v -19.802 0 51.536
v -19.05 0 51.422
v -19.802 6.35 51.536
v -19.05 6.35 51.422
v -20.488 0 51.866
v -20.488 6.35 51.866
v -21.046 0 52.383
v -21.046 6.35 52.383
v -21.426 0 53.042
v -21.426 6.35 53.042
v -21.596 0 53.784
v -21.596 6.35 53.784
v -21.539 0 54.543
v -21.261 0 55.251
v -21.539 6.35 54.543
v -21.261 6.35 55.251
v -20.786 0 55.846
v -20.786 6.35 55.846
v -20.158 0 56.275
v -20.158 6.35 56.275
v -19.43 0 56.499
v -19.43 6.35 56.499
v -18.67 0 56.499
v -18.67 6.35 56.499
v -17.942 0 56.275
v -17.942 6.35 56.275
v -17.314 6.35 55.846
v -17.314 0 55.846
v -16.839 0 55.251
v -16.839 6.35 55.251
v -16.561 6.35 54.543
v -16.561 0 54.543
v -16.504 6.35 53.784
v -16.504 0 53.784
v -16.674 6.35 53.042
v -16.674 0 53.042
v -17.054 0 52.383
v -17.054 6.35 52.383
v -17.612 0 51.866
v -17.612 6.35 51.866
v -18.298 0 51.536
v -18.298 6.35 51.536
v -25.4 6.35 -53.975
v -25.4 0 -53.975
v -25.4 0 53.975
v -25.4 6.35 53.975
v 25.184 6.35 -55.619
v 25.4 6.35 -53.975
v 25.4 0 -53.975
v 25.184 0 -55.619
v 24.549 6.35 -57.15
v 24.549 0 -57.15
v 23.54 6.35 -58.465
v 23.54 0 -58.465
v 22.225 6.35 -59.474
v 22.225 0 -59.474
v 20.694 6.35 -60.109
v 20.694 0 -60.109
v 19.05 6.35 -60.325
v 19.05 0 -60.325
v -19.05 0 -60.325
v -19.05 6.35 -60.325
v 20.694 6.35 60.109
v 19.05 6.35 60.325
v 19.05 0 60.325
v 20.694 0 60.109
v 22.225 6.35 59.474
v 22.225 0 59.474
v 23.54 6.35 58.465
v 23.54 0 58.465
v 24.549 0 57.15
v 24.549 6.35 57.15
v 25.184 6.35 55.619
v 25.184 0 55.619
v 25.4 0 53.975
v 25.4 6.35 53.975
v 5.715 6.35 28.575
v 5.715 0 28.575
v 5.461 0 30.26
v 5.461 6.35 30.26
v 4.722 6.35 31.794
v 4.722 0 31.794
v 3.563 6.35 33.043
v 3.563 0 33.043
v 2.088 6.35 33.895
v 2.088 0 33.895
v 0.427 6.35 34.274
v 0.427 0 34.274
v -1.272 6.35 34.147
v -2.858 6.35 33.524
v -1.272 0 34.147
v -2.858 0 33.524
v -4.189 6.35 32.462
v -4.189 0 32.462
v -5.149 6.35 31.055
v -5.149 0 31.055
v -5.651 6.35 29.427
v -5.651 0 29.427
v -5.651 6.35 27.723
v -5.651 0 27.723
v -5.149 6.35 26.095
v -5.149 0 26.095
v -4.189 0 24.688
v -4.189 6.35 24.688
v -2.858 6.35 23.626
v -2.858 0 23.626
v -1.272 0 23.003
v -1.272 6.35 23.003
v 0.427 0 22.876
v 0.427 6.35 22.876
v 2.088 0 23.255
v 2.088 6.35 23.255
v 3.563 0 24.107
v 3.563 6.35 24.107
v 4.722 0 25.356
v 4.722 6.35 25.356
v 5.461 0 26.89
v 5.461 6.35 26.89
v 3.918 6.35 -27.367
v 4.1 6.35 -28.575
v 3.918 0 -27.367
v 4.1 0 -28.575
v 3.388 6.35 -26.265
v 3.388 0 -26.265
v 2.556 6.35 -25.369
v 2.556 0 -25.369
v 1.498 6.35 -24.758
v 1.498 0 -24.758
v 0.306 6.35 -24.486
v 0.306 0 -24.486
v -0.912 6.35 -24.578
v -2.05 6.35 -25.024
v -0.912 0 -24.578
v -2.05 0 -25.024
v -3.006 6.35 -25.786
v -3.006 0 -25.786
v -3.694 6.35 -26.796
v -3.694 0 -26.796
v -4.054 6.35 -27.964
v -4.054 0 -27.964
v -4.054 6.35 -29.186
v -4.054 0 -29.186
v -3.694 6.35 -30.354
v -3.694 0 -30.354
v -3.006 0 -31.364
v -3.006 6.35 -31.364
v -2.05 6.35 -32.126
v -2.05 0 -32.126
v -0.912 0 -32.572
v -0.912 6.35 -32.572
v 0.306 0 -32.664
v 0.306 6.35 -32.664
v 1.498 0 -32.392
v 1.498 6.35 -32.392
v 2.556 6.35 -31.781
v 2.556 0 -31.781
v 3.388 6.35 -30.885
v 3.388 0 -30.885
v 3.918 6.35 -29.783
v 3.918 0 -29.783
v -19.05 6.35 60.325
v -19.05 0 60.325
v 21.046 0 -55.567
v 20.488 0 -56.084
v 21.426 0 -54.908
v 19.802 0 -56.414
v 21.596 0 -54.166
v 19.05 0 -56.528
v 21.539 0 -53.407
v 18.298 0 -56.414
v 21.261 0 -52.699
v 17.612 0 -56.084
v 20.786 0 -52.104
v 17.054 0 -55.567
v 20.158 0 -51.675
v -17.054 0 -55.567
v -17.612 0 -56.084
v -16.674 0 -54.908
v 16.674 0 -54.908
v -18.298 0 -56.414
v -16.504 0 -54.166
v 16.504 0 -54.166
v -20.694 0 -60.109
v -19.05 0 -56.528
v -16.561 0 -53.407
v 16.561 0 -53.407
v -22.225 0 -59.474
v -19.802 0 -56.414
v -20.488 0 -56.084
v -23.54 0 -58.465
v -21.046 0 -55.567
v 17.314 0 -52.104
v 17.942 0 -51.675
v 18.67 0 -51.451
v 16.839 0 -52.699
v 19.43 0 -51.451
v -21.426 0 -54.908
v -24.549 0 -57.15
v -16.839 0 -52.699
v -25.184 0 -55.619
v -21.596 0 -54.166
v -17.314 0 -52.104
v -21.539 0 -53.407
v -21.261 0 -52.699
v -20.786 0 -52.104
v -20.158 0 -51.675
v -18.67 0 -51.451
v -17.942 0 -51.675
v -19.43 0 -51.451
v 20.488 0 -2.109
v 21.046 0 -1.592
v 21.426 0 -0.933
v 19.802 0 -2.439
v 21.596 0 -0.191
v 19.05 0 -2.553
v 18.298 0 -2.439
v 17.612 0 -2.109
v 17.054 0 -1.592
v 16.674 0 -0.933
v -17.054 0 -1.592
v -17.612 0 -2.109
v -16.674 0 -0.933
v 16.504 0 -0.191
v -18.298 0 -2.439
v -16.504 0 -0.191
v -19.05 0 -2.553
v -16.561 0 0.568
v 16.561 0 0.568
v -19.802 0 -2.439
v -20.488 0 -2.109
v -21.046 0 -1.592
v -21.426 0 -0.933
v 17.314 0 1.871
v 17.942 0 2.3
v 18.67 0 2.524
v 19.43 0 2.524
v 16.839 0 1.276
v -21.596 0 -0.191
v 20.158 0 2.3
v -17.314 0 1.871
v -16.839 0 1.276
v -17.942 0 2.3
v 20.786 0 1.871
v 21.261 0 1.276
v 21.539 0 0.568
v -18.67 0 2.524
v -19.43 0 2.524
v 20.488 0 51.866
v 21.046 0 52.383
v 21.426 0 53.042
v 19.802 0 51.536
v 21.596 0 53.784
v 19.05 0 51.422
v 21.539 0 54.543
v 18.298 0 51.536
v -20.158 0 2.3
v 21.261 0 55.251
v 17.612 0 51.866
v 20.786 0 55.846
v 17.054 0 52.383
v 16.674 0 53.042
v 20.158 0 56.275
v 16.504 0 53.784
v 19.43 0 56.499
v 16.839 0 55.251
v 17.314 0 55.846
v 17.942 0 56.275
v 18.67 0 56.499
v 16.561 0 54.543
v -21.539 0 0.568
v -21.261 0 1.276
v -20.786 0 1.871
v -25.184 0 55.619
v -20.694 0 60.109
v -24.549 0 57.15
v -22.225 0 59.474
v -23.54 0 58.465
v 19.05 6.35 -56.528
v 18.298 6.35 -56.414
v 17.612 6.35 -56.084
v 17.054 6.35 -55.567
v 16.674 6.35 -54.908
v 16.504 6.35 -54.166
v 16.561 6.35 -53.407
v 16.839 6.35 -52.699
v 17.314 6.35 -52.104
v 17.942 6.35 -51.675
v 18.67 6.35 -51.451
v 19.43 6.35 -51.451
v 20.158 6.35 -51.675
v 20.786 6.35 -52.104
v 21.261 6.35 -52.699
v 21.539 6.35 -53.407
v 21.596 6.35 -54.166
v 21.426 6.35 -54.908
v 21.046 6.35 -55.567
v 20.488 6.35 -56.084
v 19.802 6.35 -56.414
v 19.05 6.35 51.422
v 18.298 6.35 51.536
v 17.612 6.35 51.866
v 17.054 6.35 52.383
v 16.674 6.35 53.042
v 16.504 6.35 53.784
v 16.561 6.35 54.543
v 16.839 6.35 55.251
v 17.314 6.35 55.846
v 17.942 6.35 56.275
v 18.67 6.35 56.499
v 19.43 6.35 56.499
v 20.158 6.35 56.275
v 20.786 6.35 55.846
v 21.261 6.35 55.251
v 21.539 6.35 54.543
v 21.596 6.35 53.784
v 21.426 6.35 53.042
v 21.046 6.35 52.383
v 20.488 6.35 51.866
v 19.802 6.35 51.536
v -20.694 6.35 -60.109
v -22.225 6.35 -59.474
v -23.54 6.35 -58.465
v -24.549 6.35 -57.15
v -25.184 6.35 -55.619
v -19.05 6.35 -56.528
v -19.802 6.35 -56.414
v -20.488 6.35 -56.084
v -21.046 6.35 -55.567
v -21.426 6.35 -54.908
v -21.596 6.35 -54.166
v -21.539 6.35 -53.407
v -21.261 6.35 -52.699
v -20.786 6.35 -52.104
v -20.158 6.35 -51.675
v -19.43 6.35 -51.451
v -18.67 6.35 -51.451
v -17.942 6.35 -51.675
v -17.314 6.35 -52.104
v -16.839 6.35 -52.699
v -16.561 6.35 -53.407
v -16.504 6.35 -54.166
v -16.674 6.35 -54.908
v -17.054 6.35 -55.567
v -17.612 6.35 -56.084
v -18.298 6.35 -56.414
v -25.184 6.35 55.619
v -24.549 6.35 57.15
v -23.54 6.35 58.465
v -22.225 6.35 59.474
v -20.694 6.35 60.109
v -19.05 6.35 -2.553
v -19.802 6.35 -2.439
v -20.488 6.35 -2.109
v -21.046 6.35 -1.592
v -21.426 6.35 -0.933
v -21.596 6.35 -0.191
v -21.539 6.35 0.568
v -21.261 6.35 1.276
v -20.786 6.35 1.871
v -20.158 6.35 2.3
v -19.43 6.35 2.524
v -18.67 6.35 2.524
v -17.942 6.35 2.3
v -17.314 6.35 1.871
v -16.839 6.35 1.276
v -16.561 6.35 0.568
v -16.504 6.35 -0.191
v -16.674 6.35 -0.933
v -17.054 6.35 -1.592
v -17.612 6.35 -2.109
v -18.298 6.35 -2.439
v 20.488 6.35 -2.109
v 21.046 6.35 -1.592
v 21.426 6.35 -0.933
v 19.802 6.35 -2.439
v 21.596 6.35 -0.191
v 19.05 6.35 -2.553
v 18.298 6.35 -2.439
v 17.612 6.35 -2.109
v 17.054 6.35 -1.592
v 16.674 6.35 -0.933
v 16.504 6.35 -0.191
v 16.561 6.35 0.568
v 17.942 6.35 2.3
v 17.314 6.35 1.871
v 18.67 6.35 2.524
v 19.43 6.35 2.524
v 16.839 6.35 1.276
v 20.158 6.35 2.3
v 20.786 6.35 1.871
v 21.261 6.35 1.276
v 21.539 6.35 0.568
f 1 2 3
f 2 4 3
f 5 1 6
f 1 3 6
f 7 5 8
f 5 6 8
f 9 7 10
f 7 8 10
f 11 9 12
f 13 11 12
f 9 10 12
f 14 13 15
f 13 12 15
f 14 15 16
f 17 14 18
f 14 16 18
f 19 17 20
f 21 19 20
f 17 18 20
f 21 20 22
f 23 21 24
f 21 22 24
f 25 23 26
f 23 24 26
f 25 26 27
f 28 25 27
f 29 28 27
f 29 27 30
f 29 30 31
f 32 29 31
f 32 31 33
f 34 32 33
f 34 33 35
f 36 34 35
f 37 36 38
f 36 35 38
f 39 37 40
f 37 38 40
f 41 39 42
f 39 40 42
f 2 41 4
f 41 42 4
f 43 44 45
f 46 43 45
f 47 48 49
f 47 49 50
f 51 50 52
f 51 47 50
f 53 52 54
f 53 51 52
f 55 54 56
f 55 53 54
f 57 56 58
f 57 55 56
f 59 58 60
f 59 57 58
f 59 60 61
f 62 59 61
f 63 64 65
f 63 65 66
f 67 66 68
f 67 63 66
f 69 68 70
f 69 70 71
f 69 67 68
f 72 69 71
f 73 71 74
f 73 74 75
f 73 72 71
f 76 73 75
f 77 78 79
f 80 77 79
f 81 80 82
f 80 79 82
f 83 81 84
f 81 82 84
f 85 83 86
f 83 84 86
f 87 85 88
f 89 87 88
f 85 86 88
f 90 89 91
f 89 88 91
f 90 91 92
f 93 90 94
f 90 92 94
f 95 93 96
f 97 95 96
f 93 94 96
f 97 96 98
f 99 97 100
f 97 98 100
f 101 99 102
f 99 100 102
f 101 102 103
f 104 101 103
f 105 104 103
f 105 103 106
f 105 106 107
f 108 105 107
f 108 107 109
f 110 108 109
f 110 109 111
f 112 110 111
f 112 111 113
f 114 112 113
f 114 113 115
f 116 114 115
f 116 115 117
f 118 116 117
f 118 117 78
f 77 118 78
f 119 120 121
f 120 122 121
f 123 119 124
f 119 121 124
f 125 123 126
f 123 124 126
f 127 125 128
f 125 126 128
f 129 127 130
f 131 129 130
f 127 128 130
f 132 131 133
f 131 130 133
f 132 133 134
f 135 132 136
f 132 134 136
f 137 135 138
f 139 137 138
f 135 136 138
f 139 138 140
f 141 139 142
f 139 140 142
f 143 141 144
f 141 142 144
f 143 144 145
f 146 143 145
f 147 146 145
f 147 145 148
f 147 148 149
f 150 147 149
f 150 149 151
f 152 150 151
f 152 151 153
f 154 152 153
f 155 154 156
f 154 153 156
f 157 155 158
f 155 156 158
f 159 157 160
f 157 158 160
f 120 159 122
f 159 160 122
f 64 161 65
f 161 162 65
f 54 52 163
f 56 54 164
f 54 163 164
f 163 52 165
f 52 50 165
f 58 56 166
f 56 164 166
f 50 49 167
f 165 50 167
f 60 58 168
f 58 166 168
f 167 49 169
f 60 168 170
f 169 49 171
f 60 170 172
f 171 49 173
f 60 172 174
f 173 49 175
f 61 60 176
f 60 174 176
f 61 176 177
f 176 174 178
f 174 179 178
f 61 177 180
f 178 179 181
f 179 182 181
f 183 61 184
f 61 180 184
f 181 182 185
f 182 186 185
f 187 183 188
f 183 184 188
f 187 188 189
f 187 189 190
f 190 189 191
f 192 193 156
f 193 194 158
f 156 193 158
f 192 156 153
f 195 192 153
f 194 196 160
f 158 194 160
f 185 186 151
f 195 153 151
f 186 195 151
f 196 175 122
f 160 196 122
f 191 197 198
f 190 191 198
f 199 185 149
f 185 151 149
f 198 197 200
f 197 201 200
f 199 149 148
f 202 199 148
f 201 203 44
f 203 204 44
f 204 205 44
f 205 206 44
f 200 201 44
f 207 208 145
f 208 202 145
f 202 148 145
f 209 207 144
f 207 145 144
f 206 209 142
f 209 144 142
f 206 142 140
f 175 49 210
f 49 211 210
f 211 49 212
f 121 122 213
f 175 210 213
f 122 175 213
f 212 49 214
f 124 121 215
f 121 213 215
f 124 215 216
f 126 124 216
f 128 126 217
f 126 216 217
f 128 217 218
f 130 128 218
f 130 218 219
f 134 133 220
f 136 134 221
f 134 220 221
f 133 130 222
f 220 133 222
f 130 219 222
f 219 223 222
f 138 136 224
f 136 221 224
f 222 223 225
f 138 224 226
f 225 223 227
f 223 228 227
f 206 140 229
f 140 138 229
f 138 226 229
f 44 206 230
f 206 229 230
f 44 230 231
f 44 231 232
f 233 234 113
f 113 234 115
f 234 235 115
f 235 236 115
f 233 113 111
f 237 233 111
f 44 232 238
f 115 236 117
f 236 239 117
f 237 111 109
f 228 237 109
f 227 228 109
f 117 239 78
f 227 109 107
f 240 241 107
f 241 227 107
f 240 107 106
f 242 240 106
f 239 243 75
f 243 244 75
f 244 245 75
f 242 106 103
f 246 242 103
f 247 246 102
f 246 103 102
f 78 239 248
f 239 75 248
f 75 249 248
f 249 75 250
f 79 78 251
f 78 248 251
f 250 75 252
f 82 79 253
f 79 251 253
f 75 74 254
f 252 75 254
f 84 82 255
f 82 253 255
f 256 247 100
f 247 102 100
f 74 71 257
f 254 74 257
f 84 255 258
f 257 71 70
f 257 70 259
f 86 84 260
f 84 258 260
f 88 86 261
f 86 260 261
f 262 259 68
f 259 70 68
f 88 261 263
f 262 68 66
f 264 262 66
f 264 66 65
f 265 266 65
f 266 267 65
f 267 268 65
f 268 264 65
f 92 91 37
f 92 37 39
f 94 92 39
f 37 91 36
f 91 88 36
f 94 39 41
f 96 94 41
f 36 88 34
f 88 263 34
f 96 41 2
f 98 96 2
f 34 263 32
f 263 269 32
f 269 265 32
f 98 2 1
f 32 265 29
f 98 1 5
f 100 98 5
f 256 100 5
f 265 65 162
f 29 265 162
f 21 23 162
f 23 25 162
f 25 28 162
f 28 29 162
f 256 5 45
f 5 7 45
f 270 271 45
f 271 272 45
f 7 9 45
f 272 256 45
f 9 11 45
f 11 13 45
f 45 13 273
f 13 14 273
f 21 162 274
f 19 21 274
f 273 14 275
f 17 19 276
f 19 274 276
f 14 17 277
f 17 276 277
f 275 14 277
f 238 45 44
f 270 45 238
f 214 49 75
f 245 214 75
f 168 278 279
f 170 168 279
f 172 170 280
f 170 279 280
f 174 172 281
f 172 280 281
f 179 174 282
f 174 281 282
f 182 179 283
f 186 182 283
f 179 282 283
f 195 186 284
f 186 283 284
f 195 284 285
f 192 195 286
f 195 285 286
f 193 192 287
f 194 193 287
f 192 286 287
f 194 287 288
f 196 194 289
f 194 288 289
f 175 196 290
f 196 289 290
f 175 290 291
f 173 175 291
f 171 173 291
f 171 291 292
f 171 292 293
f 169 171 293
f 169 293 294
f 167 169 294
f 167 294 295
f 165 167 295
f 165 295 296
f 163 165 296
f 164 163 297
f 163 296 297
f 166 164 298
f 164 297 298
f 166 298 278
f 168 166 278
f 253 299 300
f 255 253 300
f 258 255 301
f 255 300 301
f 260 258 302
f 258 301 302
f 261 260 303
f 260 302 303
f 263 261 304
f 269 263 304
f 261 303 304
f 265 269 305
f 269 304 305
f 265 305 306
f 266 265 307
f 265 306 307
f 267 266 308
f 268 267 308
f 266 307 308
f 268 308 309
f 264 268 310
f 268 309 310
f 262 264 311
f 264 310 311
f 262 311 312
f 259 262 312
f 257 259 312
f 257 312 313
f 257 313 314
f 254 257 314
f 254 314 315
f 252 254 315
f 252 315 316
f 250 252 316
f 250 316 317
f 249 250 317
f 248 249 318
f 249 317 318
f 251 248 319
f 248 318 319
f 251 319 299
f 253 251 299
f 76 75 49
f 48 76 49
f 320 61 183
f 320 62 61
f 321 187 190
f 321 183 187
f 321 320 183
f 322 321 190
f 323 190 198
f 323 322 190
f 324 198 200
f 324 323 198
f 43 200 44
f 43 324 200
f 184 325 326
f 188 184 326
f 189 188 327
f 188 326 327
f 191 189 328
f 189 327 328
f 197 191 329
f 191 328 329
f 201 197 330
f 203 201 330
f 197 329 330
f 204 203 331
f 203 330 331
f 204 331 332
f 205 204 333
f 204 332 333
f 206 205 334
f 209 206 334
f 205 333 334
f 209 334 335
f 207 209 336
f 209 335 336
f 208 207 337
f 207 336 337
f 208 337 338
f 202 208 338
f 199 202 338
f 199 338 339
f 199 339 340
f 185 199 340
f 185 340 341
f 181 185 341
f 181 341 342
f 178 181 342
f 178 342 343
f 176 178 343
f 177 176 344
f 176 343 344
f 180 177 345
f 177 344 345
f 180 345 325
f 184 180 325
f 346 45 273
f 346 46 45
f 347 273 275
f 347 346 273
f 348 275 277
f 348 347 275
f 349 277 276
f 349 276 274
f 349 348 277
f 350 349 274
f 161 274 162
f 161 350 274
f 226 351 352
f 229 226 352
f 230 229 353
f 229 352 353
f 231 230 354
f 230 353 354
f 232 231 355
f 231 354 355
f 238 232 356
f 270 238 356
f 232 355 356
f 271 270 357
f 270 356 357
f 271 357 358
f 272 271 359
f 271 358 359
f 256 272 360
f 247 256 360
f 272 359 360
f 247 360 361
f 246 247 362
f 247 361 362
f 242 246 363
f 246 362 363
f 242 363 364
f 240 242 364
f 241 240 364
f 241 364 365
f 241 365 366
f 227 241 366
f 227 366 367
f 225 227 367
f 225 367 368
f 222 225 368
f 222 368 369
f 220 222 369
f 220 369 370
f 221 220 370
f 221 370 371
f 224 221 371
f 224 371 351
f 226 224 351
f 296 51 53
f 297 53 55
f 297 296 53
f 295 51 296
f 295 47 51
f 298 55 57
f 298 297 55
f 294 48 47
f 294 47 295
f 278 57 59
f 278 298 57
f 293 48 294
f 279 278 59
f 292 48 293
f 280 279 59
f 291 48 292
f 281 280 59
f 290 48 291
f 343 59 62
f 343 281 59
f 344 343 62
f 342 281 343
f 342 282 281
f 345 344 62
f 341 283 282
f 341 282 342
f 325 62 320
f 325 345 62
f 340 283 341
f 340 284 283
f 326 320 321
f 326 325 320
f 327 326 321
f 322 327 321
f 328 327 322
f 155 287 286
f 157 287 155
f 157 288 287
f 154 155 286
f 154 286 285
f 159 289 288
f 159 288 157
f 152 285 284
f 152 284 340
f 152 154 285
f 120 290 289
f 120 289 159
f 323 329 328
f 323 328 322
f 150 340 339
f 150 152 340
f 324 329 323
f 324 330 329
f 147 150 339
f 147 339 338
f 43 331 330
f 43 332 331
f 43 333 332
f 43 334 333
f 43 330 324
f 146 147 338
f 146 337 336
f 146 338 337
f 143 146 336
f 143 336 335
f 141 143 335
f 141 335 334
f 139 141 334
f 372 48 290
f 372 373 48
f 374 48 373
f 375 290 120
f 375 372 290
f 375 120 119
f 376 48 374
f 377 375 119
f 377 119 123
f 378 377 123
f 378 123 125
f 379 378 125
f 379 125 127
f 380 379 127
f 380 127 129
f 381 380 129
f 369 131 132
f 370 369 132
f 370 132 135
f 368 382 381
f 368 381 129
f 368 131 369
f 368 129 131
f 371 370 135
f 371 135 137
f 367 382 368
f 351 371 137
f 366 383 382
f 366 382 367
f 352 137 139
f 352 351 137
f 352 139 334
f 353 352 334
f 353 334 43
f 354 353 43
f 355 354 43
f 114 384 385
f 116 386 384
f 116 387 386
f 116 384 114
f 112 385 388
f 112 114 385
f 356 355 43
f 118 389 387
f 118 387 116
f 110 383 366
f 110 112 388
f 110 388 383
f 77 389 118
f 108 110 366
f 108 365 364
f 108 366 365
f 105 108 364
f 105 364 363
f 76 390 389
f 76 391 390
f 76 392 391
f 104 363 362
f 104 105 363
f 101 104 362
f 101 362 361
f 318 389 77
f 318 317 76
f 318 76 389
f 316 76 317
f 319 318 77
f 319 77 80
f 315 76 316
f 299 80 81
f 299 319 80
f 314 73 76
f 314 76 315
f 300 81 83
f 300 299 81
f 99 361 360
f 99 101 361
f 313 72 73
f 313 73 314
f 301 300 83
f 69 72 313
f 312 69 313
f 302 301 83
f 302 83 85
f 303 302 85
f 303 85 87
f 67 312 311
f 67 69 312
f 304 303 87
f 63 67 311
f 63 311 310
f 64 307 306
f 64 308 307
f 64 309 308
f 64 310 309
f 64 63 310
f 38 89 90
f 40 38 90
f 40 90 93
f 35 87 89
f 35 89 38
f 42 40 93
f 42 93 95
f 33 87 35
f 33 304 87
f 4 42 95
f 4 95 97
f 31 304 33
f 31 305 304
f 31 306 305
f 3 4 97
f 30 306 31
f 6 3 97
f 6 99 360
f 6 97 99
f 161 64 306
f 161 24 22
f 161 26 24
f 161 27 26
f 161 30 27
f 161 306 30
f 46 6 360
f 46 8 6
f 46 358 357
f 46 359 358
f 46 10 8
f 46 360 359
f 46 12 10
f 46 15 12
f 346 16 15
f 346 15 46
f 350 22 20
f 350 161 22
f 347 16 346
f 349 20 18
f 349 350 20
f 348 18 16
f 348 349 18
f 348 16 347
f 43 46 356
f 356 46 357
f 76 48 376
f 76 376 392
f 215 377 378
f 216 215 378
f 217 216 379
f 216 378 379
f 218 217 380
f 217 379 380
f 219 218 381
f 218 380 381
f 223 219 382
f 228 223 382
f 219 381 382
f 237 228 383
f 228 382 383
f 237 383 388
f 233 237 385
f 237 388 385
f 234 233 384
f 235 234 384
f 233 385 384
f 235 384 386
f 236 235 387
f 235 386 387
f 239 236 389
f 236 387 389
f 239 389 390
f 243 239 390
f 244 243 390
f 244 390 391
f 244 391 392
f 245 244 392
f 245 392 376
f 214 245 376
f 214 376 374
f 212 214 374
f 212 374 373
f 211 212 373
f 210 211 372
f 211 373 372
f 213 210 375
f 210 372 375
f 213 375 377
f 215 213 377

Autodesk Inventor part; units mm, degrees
ref_plane "YZ Plane" through (0, 0, 0) normal (1, 0, 0) x (0, 1, 0)
ref_plane "XZ Plane" through (0, 0, 0) normal (0, 1, 0) x (-1, 0, 0)
ref_plane "XY Plane" through (0, 0, 0) normal (0, 0, 1) x (1, 0, 0)
sketch "Sketch1" plane through (0, 0, 0) normal (0, 1, 0) x (-1, 0, 0)
  line L0 (25.4, 60.325) -> (-25.4, 60.325)
  line L1 (-25.4, 60.325) -> (-25.4, -60.325)
  line L2 (-25.4, -60.325) -> (25.4, -60.325)
  line L3 (25.4, -60.325) -> (25.4, 60.325)
  line L4 (25.4, 60.325) -> (-25.4, -60.325) construction
  line L5 (-25.4, 60.325) -> (25.4, -60.325) construction
  point P0 (0, 0)
  point P1 (0, 28.575)
  point P2 (0, -28.575)
  dimension "d0" = 50.8
  dimension "d1" = 120.65
  dimension "d2" = 57.15
  dimension "d3" = 28.575
extrude "Plate1" add sketch "Sketch1" along normal blind 6.35
sketch "Sketch2" plane through (0, 0, 0) normal (0, -1, 0) x (1, 0, 0)
  circle A0 centre (0, 28.575) radius 5.715
  circle A1 centre (0, -28.575) radius 4.1
  point P0 (0, 0)
  dimension "d5" = 28.575
  dimension "d6" = 11.43
  dimension "d9" = 28.575
  dimension "d10" = 8.2
extrude "Cut1" cut sketch "Sketch2" against normal blind 6.35
sketch "Sketch3" plane through (0, 0, 0) normal (0, -1, 0) x (1, 0, 0)
  line L0 (-25.4, 60.325) -> (25.4, 60.325) construction
  line L1 (-25.4, -60.325) -> (-25.4, 60.325) construction
  circle A0 centre (0, 28.575) radius 5.715 projected
  circle A1 centre (0, 28.575) radius 25.4 construction
  circle A2 centre (0, -28.575) radius 4.1 projected
  circle A3 centre (0, -28.575) radius 25.4 construction
  point P0 (0, 0)
  point P1 (-19.05, 53.975)
  point P2 (19.05, 53.975)
  point P3 (-19.05, 0)
  point P4 (19.05, 0)
  point P5 (-19.05, -53.975)
  point P6 (19.05, -53.975)
  dimension "d13" = 38.1
  dimension "d16" = 53.975
  dimension "d19" = 6.35
  dimension "d20" = 6.35
  dimension "d29" = 50.8
  dimension "d30" = 50.8
hole "Hole1" at (-19.05, 0, 53.975) at (19.05, 0, 53.975) at (-19.05, 0, 0) at (19.05, 0, 0) at (-19.05, 0, -53.975) at (19.05, 0, -53.975) direction (0, 1, 0) diameter 5.1054 end through all clearance for "Flat Head Machine Screw (82)" size "#10" standard "Ansi Unified Screw Threads"
fillet "Corner Round1" radius 6.35 4 edges at (25.4, 3.175, -60.325) (-25.4, 3.175, -60.325) (25.4, 3.175, 60.325) (-25.4, 3.175, 60.325)
equation "\"d9\" = d5"
equation "\"d7\" = Thickness"
equation "\"d26\" = Thickness"
equation "\"d4\" = Thickness"
equation "\"BendRadius\" = Thickness"
equation "\"BendReliefWidth\" = Thickness"
equation "\"BendReliefDepth\" = 0.5 * Thickness"
equation "\"CornerReliefSize\" = 4 * Thickness"
equation "\"MinimumRemnant\" = 2 * Thickness"
equation "\"TransitionRadius\" = BendRadius"
equation "\"JacobiRadiusSize\" = BendRadius"
equation "\"GapSize\" = Thickness"
equation "\"Thickness\" = 6.35"
properties part number "PLATE,MAGNET-MOUNT" material "Aluminum 6061"
